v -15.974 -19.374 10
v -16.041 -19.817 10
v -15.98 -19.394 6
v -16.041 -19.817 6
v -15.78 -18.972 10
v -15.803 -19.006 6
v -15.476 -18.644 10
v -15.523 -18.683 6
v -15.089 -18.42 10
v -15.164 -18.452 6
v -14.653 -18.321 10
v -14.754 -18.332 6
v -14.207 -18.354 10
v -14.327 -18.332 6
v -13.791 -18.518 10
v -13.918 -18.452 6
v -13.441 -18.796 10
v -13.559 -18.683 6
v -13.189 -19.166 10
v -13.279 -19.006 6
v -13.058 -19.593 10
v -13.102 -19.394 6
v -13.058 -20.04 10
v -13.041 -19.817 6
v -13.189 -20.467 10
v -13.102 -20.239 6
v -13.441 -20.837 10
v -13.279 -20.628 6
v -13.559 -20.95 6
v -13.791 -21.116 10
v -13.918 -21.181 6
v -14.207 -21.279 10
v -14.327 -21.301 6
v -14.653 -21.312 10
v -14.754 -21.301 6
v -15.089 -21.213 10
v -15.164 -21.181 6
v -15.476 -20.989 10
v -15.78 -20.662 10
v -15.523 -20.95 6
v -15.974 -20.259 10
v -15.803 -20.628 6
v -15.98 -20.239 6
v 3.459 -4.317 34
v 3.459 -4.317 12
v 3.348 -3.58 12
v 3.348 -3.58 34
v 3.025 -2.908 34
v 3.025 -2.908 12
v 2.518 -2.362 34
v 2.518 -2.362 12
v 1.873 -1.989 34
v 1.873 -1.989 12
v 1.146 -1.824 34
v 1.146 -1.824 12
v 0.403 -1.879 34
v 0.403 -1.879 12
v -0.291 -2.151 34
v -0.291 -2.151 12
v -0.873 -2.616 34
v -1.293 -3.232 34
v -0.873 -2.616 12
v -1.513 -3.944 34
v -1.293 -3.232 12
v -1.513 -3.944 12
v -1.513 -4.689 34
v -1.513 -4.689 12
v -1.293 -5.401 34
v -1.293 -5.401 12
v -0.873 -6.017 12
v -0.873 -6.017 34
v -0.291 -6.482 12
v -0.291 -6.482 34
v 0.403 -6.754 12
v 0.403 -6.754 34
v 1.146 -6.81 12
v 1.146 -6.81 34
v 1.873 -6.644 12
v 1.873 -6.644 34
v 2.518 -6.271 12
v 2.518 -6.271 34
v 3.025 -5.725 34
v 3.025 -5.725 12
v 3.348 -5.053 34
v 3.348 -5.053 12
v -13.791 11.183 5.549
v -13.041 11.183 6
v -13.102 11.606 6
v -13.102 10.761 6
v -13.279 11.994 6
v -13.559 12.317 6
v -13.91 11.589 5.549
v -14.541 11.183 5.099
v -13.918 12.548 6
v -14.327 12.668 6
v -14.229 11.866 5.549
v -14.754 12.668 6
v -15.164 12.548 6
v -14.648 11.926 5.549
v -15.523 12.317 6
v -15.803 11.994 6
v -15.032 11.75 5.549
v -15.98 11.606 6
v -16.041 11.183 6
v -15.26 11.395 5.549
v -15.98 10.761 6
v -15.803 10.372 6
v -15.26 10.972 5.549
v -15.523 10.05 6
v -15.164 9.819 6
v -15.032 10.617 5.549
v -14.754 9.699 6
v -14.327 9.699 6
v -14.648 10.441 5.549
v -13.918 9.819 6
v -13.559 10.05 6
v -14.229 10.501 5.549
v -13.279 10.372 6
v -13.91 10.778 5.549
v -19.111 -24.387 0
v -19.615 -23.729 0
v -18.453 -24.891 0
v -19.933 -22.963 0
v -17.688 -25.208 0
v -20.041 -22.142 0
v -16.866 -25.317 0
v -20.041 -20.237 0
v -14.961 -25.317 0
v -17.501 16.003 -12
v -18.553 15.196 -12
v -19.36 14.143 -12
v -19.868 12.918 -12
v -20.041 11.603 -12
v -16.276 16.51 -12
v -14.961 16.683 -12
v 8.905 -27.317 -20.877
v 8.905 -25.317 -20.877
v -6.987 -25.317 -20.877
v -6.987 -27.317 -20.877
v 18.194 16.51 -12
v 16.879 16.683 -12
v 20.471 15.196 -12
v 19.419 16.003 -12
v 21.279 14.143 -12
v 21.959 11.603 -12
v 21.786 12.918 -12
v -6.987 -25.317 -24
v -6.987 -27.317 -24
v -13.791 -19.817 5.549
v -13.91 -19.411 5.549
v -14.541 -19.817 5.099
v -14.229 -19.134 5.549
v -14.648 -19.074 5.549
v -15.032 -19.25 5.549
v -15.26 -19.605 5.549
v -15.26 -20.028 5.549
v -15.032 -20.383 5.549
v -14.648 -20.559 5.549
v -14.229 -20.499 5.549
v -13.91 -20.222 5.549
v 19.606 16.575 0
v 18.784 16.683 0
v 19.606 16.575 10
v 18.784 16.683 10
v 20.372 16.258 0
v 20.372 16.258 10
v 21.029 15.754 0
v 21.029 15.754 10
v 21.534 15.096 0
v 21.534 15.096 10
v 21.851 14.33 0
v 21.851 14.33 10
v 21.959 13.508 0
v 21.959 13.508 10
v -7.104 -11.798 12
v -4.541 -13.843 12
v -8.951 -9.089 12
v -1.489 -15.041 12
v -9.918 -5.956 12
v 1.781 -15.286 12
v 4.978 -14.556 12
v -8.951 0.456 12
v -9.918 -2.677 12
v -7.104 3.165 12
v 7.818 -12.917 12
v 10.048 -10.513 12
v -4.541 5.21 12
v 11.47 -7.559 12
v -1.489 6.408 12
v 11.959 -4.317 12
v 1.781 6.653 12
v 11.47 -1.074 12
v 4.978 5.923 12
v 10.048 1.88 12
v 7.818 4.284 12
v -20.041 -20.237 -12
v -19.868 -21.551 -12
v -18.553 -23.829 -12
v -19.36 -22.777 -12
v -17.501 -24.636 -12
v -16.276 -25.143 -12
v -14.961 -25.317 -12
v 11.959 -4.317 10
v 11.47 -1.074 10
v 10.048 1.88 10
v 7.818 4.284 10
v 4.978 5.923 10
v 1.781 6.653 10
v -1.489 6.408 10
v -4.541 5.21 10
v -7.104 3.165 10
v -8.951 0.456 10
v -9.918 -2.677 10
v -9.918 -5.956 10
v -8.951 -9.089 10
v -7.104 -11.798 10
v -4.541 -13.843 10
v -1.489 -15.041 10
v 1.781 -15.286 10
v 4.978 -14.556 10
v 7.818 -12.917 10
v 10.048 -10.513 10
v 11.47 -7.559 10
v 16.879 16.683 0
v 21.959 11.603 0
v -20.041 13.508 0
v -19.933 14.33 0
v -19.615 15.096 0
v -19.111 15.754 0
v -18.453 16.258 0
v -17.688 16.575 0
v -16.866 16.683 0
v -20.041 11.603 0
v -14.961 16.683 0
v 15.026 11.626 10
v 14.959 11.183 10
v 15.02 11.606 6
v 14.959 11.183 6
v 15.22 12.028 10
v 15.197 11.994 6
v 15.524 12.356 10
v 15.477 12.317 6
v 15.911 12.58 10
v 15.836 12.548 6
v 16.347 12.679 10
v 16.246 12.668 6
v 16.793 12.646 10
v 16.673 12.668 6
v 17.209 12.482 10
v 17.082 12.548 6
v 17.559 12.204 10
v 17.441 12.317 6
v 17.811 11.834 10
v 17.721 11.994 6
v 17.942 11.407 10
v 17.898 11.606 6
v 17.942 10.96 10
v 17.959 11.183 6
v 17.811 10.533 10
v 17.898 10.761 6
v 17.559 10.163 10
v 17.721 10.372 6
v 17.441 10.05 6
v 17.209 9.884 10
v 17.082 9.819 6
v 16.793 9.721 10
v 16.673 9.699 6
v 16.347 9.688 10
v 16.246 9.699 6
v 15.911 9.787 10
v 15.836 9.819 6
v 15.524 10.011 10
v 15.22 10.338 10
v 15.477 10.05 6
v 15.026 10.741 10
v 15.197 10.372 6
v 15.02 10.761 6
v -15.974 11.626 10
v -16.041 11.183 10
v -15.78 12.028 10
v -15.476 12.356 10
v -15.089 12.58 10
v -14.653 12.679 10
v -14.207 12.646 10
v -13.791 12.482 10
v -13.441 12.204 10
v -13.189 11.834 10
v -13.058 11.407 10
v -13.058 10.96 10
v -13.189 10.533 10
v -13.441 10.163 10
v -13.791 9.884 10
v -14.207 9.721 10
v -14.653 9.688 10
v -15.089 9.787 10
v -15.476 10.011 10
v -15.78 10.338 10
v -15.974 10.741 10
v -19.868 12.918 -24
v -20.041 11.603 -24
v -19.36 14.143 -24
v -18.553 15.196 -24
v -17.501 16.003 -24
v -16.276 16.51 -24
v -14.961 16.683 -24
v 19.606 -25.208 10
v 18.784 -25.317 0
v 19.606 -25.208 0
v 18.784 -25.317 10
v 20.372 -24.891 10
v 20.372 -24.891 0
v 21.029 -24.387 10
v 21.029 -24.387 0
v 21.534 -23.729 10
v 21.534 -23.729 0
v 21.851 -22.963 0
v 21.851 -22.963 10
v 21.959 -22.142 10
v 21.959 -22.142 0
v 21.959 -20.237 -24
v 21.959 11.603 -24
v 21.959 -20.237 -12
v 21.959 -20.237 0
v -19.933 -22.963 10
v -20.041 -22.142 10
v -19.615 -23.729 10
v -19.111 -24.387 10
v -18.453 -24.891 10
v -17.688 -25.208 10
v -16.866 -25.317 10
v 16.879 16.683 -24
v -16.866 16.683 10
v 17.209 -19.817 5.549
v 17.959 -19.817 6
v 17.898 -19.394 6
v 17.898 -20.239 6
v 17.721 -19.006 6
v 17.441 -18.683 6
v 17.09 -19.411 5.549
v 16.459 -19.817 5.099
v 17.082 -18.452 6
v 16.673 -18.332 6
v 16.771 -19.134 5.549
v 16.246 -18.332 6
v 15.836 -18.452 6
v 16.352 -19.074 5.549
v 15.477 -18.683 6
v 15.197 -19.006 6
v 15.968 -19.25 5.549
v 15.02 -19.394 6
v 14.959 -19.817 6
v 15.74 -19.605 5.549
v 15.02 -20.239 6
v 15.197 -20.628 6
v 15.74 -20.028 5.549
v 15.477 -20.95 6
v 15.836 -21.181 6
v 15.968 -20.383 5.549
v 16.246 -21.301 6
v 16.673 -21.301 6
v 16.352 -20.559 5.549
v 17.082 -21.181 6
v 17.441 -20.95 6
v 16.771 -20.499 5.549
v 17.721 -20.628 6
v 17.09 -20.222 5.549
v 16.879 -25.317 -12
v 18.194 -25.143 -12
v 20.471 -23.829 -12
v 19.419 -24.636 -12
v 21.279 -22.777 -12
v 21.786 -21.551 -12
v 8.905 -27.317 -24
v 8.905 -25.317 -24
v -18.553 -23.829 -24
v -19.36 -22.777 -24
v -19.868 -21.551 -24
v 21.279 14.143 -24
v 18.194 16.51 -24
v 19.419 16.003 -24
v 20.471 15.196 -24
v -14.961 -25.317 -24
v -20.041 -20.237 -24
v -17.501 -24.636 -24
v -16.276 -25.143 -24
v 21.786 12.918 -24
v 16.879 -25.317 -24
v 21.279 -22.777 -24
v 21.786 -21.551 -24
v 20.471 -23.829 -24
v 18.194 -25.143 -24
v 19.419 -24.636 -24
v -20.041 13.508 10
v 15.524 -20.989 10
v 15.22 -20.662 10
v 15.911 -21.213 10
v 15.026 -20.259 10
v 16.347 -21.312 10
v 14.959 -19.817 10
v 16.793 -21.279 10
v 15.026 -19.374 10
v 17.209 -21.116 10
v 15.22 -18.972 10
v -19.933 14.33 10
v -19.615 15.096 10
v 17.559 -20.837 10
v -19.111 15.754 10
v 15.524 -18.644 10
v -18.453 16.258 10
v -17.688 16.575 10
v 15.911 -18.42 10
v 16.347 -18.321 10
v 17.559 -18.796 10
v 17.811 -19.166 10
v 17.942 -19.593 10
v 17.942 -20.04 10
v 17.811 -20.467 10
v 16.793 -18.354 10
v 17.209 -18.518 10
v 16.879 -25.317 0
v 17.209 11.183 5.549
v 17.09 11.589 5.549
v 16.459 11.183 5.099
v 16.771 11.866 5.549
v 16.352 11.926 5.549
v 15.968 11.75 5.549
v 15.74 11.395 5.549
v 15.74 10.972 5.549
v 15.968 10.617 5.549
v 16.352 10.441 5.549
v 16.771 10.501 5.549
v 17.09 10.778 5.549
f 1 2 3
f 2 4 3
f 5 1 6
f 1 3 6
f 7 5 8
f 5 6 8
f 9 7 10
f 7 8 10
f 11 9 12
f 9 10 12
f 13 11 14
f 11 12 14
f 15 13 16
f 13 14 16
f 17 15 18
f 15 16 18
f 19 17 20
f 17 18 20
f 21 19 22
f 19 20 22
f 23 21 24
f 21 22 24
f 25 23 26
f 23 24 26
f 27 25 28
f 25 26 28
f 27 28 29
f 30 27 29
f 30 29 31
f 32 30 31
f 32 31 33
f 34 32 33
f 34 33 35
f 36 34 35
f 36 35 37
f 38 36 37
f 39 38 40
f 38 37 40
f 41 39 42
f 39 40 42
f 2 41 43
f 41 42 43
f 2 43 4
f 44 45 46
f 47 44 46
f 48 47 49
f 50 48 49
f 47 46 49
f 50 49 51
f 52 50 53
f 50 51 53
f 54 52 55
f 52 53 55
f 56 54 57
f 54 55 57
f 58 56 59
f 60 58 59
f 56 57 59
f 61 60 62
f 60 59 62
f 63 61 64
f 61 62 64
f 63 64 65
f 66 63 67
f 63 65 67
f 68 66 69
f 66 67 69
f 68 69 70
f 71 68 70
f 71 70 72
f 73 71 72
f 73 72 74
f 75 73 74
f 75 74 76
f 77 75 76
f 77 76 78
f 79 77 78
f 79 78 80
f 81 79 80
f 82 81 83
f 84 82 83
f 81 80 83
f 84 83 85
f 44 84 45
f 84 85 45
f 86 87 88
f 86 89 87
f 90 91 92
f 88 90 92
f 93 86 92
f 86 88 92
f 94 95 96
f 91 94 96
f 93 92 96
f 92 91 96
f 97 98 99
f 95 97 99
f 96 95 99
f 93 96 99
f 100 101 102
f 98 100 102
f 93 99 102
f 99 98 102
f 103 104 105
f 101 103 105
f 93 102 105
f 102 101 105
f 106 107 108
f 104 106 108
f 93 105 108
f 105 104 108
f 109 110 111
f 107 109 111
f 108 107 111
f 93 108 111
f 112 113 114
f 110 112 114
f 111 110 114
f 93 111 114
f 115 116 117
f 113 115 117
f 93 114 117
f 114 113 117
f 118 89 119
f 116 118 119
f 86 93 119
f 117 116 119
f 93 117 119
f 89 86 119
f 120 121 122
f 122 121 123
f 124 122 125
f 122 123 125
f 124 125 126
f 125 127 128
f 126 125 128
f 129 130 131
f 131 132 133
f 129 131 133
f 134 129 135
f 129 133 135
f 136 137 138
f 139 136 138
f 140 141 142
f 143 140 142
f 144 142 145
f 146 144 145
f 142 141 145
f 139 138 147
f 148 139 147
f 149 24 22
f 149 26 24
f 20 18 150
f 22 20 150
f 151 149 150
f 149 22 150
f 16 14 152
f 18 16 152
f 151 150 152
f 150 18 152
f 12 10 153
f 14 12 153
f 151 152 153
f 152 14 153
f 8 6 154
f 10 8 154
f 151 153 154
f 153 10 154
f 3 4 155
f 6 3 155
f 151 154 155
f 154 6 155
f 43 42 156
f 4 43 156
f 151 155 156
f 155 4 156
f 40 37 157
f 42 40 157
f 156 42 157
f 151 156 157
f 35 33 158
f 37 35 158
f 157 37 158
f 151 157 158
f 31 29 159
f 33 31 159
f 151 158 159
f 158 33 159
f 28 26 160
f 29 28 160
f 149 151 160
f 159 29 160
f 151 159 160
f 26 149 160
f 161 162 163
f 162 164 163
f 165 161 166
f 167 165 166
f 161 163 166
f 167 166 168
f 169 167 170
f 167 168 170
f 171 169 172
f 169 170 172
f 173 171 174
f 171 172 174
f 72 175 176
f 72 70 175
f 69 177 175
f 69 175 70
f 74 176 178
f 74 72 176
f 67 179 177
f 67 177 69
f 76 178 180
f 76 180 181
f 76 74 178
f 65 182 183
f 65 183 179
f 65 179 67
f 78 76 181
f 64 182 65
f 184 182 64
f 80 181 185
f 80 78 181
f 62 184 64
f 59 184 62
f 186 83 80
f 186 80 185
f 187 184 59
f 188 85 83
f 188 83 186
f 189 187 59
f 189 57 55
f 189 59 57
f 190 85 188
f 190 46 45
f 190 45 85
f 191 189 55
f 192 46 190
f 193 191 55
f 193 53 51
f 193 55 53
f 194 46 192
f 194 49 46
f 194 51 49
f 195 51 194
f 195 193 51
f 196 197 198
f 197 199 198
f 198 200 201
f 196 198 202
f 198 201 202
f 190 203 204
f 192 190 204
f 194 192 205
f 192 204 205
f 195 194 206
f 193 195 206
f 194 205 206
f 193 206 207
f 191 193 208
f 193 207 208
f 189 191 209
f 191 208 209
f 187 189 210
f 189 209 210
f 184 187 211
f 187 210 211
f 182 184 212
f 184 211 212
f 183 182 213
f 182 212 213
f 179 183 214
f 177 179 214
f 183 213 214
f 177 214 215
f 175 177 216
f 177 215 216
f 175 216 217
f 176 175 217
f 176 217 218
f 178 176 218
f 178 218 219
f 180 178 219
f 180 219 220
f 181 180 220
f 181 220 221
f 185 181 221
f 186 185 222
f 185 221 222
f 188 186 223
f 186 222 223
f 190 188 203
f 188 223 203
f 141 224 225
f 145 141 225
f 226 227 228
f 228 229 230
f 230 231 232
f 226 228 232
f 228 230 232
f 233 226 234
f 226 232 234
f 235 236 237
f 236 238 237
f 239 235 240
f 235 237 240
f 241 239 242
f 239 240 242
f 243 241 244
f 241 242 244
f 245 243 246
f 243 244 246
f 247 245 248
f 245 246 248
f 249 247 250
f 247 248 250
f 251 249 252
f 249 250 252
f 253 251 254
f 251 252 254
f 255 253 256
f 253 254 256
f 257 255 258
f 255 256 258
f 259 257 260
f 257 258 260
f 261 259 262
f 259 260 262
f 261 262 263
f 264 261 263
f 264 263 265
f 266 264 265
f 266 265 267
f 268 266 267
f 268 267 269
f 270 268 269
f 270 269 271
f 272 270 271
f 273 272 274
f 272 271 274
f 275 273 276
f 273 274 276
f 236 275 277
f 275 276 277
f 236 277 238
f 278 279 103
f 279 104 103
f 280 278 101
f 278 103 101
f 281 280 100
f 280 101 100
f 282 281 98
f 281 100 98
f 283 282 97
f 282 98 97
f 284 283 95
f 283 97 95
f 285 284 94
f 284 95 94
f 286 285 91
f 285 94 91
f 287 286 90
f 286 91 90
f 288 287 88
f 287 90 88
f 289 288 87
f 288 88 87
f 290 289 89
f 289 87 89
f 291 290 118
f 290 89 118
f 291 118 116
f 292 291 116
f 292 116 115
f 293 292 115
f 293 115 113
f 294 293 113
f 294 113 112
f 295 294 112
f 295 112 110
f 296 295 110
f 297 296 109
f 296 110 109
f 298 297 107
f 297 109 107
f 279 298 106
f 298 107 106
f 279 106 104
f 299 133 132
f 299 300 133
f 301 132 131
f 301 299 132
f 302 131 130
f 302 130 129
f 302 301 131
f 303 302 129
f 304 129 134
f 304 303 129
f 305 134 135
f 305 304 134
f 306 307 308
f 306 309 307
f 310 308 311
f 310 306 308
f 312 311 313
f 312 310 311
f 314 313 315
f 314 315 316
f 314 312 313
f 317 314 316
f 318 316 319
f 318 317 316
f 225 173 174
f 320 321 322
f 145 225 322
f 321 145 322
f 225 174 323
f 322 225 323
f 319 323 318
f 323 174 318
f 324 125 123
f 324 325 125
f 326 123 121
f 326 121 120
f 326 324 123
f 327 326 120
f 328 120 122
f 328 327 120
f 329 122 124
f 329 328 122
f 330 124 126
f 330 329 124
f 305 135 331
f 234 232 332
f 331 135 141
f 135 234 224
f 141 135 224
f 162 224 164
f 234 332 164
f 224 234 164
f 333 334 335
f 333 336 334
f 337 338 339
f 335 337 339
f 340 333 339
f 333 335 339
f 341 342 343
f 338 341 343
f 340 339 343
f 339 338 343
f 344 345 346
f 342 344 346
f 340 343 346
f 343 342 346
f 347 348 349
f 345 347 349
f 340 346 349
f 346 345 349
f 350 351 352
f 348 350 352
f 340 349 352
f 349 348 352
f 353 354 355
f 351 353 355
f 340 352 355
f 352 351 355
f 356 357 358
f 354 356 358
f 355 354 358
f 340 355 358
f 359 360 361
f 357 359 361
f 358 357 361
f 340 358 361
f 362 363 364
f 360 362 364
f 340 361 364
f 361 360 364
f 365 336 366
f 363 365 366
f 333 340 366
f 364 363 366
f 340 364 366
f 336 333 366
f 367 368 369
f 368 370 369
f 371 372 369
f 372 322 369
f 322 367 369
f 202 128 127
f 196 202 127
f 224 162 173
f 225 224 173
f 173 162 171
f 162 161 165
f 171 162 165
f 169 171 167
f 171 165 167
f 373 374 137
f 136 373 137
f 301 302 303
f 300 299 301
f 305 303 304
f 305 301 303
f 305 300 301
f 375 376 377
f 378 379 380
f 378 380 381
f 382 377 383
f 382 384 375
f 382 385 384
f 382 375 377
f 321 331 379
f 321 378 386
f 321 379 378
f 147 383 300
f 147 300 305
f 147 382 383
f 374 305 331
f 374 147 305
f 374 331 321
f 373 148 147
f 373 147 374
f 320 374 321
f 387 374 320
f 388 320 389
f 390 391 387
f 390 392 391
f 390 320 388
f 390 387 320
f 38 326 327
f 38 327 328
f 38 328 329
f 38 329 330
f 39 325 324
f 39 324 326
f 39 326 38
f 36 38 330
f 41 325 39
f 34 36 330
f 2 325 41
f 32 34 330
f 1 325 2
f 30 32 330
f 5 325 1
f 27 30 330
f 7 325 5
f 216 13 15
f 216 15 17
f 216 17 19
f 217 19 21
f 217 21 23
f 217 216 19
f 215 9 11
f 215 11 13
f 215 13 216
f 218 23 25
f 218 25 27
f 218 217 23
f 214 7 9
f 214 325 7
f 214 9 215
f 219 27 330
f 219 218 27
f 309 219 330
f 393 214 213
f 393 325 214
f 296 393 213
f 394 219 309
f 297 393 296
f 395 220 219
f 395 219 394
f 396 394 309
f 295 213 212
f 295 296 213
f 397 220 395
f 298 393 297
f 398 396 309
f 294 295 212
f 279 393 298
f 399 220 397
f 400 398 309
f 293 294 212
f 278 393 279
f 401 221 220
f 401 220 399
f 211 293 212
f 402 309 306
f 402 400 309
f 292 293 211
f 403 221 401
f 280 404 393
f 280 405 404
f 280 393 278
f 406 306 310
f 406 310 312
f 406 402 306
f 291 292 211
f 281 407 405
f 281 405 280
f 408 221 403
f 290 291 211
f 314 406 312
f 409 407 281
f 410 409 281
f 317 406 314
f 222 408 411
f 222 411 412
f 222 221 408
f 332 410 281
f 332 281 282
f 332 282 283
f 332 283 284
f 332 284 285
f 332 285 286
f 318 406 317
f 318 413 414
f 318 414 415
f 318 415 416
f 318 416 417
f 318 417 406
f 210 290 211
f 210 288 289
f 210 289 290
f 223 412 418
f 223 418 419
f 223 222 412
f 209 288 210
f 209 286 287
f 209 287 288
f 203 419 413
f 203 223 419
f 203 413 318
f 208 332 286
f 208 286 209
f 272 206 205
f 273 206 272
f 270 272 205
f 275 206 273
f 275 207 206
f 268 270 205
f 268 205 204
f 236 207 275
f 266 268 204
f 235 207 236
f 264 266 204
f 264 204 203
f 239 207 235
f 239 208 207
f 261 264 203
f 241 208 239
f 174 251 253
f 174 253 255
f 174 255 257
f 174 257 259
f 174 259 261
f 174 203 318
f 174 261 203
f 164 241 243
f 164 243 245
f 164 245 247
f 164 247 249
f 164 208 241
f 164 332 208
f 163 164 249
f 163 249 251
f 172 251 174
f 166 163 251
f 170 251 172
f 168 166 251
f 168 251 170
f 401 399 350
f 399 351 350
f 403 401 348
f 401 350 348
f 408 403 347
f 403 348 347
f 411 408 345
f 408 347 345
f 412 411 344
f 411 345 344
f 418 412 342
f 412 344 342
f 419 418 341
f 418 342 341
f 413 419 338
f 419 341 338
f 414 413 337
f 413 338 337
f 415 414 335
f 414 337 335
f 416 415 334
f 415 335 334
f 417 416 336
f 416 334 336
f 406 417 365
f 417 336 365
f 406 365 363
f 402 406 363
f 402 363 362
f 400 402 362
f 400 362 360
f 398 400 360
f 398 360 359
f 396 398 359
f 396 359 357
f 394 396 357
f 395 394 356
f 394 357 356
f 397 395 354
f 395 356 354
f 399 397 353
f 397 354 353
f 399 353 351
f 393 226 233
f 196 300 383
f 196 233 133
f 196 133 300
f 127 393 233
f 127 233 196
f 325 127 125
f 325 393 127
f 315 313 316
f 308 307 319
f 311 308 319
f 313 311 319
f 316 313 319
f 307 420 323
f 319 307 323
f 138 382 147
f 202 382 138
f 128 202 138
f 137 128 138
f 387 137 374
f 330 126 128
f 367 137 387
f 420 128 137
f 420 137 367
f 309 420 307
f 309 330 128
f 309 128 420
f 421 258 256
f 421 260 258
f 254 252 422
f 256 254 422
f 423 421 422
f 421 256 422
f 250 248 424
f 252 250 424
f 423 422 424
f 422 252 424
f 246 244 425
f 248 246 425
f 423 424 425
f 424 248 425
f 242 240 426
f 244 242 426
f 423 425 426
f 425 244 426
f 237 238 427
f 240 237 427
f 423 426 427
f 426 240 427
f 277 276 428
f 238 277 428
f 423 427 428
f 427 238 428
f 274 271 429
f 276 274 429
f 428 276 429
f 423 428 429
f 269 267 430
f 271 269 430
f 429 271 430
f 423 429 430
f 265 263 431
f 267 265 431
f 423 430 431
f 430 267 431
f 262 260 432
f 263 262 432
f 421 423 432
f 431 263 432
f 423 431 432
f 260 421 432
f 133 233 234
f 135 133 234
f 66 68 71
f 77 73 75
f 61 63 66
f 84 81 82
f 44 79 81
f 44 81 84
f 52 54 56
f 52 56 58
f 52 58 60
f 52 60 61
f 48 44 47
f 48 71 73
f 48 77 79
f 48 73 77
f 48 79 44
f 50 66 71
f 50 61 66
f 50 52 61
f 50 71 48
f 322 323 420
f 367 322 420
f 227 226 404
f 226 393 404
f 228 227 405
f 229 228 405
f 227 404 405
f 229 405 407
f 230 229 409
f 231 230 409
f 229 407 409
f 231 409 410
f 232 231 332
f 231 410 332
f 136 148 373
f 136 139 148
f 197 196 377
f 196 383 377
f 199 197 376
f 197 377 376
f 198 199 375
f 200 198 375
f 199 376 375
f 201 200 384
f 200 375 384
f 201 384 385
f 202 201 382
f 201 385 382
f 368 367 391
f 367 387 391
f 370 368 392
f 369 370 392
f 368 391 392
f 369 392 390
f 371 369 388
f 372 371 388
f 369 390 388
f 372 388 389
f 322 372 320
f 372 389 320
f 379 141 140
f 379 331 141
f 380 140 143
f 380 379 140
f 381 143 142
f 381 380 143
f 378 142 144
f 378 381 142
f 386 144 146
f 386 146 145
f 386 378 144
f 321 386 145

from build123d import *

# Parameters (mm, degrees)
F0_W      = 42
F0_H      = 42
F1_DEPTH  = 10
F2_R      = 11
F3_DEPTH  = 2
F4_R      = 3.175
F6_DEPTH  = 12
F7_W      = 42
F7_H      = 42
F8_DEPTH  = 12
F9_R      = 5.08
F11_D     = 3
F11_DEPTH = 4
F11_TIP   = 0.9012909285
F12_R     = 2.5
F13_DEPTH = 22
F15_DEPTH = 2


with BuildPart() as f1:
    # F0 (on Top) → F1 (new body)
    with BuildSketch(Plane.XY):
        with Locations((0.959161669, -4.3165409938)):
            Rectangle(F0_W, F0_H)
    extrude(amount=F1_DEPTH)

    # F2 (on face) → F3 (join)
    with BuildSketch(Plane.XY.offset(10)):
        with Locations((0.959161669, -4.3165409938)):
            Circle(F2_R)
    extrude(amount=F3_DEPTH)

    # F4
    f4_edges = [f1.edges().sort_by_distance(p)[0] for p in [
        (21.959162, -25.316541, 5),
        (21.959162, 16.683459, 5),
        (-20.040838, 16.683459, 5),
        (-20.040838, -25.316541, 5),
    ]]
    fillet(f4_edges, radius=F4_R)

    # F5 (on face) → F6 (join)
    with BuildSketch(Plane(origin=(0, 0, 0), x_dir=(1, 0, 0), z_dir=(0, 0, -1))):
        Polygon((-20.040838331, 20.2365409938), (-20.040838331, -11.6034590062), (-14.960838331, -16.6834590062), (0.959161669, -16.6834590062), (16.879161669, -16.6834590062), (21.959161669, -11.6034590062), (21.959161669, 20.2365409938), (16.879161669, 25.3165409938), (0.959161669, 25.3165409938), (-14.960838331, 25.3165409938), align=None)
    extrude(amount=F6_DEPTH)

    # F7 (on face) → F8 (join)
    with BuildSketch(Plane(origin=(0, 0, -12), x_dir=(1, 0, 0), z_dir=(0, 0, -1))):
        with Locations((0.959161669, 4.3165409938)):
            Rectangle(F7_W, F7_H)
    extrude(amount=F8_DEPTH)

    # F9
    f9_edges = [f1.edges().sort_by_distance(p)[0] for p in [
        (21.959162, 16.683459, -18),
        (21.959162, -25.316541, -18),
        (-20.040838, 16.683459, -18),
        (-20.040838, -25.316541, -18),
    ]]
    fillet(f9_edges, radius=F9_R)

    # F11
    with Locations(Plane.XY.offset(10)):
        with Locations((-14.540838331, 11.1834590062), (-14.540838331, -19.8165409938), (16.459161669, -19.8165409938), (16.459161669, 11.1834590062)):
            Hole(F11_D / 2, depth=F11_DEPTH)
            with Locations((0, 0, -(F11_DEPTH + F11_TIP / 2))):  # 118° drill point
                Cone(0, F11_D / 2, F11_TIP, mode=Mode.SUBTRACT)

    # F12 (on face) → F13 (join)
    with BuildSketch(Plane.XY.offset(12)):
        with Locations((0.959161669, -4.3165409938)):
            Circle(F12_R)
    extrude(amount=F13_DEPTH)

    # F14 (on face) → F15 (join)
    with BuildSketch(Plane.XZ.offset(25.3165409938)):
        Polygon((-6.987169385, -24), (0.959161669, -24), (8.905492723, -24), (8.905492723, -20.8772607148), (0.959161669, -20.8772607148), (-6.987169385, -20.8772607148), align=None)
    extrude(amount=F15_DEPTH)


solid = f1.part
